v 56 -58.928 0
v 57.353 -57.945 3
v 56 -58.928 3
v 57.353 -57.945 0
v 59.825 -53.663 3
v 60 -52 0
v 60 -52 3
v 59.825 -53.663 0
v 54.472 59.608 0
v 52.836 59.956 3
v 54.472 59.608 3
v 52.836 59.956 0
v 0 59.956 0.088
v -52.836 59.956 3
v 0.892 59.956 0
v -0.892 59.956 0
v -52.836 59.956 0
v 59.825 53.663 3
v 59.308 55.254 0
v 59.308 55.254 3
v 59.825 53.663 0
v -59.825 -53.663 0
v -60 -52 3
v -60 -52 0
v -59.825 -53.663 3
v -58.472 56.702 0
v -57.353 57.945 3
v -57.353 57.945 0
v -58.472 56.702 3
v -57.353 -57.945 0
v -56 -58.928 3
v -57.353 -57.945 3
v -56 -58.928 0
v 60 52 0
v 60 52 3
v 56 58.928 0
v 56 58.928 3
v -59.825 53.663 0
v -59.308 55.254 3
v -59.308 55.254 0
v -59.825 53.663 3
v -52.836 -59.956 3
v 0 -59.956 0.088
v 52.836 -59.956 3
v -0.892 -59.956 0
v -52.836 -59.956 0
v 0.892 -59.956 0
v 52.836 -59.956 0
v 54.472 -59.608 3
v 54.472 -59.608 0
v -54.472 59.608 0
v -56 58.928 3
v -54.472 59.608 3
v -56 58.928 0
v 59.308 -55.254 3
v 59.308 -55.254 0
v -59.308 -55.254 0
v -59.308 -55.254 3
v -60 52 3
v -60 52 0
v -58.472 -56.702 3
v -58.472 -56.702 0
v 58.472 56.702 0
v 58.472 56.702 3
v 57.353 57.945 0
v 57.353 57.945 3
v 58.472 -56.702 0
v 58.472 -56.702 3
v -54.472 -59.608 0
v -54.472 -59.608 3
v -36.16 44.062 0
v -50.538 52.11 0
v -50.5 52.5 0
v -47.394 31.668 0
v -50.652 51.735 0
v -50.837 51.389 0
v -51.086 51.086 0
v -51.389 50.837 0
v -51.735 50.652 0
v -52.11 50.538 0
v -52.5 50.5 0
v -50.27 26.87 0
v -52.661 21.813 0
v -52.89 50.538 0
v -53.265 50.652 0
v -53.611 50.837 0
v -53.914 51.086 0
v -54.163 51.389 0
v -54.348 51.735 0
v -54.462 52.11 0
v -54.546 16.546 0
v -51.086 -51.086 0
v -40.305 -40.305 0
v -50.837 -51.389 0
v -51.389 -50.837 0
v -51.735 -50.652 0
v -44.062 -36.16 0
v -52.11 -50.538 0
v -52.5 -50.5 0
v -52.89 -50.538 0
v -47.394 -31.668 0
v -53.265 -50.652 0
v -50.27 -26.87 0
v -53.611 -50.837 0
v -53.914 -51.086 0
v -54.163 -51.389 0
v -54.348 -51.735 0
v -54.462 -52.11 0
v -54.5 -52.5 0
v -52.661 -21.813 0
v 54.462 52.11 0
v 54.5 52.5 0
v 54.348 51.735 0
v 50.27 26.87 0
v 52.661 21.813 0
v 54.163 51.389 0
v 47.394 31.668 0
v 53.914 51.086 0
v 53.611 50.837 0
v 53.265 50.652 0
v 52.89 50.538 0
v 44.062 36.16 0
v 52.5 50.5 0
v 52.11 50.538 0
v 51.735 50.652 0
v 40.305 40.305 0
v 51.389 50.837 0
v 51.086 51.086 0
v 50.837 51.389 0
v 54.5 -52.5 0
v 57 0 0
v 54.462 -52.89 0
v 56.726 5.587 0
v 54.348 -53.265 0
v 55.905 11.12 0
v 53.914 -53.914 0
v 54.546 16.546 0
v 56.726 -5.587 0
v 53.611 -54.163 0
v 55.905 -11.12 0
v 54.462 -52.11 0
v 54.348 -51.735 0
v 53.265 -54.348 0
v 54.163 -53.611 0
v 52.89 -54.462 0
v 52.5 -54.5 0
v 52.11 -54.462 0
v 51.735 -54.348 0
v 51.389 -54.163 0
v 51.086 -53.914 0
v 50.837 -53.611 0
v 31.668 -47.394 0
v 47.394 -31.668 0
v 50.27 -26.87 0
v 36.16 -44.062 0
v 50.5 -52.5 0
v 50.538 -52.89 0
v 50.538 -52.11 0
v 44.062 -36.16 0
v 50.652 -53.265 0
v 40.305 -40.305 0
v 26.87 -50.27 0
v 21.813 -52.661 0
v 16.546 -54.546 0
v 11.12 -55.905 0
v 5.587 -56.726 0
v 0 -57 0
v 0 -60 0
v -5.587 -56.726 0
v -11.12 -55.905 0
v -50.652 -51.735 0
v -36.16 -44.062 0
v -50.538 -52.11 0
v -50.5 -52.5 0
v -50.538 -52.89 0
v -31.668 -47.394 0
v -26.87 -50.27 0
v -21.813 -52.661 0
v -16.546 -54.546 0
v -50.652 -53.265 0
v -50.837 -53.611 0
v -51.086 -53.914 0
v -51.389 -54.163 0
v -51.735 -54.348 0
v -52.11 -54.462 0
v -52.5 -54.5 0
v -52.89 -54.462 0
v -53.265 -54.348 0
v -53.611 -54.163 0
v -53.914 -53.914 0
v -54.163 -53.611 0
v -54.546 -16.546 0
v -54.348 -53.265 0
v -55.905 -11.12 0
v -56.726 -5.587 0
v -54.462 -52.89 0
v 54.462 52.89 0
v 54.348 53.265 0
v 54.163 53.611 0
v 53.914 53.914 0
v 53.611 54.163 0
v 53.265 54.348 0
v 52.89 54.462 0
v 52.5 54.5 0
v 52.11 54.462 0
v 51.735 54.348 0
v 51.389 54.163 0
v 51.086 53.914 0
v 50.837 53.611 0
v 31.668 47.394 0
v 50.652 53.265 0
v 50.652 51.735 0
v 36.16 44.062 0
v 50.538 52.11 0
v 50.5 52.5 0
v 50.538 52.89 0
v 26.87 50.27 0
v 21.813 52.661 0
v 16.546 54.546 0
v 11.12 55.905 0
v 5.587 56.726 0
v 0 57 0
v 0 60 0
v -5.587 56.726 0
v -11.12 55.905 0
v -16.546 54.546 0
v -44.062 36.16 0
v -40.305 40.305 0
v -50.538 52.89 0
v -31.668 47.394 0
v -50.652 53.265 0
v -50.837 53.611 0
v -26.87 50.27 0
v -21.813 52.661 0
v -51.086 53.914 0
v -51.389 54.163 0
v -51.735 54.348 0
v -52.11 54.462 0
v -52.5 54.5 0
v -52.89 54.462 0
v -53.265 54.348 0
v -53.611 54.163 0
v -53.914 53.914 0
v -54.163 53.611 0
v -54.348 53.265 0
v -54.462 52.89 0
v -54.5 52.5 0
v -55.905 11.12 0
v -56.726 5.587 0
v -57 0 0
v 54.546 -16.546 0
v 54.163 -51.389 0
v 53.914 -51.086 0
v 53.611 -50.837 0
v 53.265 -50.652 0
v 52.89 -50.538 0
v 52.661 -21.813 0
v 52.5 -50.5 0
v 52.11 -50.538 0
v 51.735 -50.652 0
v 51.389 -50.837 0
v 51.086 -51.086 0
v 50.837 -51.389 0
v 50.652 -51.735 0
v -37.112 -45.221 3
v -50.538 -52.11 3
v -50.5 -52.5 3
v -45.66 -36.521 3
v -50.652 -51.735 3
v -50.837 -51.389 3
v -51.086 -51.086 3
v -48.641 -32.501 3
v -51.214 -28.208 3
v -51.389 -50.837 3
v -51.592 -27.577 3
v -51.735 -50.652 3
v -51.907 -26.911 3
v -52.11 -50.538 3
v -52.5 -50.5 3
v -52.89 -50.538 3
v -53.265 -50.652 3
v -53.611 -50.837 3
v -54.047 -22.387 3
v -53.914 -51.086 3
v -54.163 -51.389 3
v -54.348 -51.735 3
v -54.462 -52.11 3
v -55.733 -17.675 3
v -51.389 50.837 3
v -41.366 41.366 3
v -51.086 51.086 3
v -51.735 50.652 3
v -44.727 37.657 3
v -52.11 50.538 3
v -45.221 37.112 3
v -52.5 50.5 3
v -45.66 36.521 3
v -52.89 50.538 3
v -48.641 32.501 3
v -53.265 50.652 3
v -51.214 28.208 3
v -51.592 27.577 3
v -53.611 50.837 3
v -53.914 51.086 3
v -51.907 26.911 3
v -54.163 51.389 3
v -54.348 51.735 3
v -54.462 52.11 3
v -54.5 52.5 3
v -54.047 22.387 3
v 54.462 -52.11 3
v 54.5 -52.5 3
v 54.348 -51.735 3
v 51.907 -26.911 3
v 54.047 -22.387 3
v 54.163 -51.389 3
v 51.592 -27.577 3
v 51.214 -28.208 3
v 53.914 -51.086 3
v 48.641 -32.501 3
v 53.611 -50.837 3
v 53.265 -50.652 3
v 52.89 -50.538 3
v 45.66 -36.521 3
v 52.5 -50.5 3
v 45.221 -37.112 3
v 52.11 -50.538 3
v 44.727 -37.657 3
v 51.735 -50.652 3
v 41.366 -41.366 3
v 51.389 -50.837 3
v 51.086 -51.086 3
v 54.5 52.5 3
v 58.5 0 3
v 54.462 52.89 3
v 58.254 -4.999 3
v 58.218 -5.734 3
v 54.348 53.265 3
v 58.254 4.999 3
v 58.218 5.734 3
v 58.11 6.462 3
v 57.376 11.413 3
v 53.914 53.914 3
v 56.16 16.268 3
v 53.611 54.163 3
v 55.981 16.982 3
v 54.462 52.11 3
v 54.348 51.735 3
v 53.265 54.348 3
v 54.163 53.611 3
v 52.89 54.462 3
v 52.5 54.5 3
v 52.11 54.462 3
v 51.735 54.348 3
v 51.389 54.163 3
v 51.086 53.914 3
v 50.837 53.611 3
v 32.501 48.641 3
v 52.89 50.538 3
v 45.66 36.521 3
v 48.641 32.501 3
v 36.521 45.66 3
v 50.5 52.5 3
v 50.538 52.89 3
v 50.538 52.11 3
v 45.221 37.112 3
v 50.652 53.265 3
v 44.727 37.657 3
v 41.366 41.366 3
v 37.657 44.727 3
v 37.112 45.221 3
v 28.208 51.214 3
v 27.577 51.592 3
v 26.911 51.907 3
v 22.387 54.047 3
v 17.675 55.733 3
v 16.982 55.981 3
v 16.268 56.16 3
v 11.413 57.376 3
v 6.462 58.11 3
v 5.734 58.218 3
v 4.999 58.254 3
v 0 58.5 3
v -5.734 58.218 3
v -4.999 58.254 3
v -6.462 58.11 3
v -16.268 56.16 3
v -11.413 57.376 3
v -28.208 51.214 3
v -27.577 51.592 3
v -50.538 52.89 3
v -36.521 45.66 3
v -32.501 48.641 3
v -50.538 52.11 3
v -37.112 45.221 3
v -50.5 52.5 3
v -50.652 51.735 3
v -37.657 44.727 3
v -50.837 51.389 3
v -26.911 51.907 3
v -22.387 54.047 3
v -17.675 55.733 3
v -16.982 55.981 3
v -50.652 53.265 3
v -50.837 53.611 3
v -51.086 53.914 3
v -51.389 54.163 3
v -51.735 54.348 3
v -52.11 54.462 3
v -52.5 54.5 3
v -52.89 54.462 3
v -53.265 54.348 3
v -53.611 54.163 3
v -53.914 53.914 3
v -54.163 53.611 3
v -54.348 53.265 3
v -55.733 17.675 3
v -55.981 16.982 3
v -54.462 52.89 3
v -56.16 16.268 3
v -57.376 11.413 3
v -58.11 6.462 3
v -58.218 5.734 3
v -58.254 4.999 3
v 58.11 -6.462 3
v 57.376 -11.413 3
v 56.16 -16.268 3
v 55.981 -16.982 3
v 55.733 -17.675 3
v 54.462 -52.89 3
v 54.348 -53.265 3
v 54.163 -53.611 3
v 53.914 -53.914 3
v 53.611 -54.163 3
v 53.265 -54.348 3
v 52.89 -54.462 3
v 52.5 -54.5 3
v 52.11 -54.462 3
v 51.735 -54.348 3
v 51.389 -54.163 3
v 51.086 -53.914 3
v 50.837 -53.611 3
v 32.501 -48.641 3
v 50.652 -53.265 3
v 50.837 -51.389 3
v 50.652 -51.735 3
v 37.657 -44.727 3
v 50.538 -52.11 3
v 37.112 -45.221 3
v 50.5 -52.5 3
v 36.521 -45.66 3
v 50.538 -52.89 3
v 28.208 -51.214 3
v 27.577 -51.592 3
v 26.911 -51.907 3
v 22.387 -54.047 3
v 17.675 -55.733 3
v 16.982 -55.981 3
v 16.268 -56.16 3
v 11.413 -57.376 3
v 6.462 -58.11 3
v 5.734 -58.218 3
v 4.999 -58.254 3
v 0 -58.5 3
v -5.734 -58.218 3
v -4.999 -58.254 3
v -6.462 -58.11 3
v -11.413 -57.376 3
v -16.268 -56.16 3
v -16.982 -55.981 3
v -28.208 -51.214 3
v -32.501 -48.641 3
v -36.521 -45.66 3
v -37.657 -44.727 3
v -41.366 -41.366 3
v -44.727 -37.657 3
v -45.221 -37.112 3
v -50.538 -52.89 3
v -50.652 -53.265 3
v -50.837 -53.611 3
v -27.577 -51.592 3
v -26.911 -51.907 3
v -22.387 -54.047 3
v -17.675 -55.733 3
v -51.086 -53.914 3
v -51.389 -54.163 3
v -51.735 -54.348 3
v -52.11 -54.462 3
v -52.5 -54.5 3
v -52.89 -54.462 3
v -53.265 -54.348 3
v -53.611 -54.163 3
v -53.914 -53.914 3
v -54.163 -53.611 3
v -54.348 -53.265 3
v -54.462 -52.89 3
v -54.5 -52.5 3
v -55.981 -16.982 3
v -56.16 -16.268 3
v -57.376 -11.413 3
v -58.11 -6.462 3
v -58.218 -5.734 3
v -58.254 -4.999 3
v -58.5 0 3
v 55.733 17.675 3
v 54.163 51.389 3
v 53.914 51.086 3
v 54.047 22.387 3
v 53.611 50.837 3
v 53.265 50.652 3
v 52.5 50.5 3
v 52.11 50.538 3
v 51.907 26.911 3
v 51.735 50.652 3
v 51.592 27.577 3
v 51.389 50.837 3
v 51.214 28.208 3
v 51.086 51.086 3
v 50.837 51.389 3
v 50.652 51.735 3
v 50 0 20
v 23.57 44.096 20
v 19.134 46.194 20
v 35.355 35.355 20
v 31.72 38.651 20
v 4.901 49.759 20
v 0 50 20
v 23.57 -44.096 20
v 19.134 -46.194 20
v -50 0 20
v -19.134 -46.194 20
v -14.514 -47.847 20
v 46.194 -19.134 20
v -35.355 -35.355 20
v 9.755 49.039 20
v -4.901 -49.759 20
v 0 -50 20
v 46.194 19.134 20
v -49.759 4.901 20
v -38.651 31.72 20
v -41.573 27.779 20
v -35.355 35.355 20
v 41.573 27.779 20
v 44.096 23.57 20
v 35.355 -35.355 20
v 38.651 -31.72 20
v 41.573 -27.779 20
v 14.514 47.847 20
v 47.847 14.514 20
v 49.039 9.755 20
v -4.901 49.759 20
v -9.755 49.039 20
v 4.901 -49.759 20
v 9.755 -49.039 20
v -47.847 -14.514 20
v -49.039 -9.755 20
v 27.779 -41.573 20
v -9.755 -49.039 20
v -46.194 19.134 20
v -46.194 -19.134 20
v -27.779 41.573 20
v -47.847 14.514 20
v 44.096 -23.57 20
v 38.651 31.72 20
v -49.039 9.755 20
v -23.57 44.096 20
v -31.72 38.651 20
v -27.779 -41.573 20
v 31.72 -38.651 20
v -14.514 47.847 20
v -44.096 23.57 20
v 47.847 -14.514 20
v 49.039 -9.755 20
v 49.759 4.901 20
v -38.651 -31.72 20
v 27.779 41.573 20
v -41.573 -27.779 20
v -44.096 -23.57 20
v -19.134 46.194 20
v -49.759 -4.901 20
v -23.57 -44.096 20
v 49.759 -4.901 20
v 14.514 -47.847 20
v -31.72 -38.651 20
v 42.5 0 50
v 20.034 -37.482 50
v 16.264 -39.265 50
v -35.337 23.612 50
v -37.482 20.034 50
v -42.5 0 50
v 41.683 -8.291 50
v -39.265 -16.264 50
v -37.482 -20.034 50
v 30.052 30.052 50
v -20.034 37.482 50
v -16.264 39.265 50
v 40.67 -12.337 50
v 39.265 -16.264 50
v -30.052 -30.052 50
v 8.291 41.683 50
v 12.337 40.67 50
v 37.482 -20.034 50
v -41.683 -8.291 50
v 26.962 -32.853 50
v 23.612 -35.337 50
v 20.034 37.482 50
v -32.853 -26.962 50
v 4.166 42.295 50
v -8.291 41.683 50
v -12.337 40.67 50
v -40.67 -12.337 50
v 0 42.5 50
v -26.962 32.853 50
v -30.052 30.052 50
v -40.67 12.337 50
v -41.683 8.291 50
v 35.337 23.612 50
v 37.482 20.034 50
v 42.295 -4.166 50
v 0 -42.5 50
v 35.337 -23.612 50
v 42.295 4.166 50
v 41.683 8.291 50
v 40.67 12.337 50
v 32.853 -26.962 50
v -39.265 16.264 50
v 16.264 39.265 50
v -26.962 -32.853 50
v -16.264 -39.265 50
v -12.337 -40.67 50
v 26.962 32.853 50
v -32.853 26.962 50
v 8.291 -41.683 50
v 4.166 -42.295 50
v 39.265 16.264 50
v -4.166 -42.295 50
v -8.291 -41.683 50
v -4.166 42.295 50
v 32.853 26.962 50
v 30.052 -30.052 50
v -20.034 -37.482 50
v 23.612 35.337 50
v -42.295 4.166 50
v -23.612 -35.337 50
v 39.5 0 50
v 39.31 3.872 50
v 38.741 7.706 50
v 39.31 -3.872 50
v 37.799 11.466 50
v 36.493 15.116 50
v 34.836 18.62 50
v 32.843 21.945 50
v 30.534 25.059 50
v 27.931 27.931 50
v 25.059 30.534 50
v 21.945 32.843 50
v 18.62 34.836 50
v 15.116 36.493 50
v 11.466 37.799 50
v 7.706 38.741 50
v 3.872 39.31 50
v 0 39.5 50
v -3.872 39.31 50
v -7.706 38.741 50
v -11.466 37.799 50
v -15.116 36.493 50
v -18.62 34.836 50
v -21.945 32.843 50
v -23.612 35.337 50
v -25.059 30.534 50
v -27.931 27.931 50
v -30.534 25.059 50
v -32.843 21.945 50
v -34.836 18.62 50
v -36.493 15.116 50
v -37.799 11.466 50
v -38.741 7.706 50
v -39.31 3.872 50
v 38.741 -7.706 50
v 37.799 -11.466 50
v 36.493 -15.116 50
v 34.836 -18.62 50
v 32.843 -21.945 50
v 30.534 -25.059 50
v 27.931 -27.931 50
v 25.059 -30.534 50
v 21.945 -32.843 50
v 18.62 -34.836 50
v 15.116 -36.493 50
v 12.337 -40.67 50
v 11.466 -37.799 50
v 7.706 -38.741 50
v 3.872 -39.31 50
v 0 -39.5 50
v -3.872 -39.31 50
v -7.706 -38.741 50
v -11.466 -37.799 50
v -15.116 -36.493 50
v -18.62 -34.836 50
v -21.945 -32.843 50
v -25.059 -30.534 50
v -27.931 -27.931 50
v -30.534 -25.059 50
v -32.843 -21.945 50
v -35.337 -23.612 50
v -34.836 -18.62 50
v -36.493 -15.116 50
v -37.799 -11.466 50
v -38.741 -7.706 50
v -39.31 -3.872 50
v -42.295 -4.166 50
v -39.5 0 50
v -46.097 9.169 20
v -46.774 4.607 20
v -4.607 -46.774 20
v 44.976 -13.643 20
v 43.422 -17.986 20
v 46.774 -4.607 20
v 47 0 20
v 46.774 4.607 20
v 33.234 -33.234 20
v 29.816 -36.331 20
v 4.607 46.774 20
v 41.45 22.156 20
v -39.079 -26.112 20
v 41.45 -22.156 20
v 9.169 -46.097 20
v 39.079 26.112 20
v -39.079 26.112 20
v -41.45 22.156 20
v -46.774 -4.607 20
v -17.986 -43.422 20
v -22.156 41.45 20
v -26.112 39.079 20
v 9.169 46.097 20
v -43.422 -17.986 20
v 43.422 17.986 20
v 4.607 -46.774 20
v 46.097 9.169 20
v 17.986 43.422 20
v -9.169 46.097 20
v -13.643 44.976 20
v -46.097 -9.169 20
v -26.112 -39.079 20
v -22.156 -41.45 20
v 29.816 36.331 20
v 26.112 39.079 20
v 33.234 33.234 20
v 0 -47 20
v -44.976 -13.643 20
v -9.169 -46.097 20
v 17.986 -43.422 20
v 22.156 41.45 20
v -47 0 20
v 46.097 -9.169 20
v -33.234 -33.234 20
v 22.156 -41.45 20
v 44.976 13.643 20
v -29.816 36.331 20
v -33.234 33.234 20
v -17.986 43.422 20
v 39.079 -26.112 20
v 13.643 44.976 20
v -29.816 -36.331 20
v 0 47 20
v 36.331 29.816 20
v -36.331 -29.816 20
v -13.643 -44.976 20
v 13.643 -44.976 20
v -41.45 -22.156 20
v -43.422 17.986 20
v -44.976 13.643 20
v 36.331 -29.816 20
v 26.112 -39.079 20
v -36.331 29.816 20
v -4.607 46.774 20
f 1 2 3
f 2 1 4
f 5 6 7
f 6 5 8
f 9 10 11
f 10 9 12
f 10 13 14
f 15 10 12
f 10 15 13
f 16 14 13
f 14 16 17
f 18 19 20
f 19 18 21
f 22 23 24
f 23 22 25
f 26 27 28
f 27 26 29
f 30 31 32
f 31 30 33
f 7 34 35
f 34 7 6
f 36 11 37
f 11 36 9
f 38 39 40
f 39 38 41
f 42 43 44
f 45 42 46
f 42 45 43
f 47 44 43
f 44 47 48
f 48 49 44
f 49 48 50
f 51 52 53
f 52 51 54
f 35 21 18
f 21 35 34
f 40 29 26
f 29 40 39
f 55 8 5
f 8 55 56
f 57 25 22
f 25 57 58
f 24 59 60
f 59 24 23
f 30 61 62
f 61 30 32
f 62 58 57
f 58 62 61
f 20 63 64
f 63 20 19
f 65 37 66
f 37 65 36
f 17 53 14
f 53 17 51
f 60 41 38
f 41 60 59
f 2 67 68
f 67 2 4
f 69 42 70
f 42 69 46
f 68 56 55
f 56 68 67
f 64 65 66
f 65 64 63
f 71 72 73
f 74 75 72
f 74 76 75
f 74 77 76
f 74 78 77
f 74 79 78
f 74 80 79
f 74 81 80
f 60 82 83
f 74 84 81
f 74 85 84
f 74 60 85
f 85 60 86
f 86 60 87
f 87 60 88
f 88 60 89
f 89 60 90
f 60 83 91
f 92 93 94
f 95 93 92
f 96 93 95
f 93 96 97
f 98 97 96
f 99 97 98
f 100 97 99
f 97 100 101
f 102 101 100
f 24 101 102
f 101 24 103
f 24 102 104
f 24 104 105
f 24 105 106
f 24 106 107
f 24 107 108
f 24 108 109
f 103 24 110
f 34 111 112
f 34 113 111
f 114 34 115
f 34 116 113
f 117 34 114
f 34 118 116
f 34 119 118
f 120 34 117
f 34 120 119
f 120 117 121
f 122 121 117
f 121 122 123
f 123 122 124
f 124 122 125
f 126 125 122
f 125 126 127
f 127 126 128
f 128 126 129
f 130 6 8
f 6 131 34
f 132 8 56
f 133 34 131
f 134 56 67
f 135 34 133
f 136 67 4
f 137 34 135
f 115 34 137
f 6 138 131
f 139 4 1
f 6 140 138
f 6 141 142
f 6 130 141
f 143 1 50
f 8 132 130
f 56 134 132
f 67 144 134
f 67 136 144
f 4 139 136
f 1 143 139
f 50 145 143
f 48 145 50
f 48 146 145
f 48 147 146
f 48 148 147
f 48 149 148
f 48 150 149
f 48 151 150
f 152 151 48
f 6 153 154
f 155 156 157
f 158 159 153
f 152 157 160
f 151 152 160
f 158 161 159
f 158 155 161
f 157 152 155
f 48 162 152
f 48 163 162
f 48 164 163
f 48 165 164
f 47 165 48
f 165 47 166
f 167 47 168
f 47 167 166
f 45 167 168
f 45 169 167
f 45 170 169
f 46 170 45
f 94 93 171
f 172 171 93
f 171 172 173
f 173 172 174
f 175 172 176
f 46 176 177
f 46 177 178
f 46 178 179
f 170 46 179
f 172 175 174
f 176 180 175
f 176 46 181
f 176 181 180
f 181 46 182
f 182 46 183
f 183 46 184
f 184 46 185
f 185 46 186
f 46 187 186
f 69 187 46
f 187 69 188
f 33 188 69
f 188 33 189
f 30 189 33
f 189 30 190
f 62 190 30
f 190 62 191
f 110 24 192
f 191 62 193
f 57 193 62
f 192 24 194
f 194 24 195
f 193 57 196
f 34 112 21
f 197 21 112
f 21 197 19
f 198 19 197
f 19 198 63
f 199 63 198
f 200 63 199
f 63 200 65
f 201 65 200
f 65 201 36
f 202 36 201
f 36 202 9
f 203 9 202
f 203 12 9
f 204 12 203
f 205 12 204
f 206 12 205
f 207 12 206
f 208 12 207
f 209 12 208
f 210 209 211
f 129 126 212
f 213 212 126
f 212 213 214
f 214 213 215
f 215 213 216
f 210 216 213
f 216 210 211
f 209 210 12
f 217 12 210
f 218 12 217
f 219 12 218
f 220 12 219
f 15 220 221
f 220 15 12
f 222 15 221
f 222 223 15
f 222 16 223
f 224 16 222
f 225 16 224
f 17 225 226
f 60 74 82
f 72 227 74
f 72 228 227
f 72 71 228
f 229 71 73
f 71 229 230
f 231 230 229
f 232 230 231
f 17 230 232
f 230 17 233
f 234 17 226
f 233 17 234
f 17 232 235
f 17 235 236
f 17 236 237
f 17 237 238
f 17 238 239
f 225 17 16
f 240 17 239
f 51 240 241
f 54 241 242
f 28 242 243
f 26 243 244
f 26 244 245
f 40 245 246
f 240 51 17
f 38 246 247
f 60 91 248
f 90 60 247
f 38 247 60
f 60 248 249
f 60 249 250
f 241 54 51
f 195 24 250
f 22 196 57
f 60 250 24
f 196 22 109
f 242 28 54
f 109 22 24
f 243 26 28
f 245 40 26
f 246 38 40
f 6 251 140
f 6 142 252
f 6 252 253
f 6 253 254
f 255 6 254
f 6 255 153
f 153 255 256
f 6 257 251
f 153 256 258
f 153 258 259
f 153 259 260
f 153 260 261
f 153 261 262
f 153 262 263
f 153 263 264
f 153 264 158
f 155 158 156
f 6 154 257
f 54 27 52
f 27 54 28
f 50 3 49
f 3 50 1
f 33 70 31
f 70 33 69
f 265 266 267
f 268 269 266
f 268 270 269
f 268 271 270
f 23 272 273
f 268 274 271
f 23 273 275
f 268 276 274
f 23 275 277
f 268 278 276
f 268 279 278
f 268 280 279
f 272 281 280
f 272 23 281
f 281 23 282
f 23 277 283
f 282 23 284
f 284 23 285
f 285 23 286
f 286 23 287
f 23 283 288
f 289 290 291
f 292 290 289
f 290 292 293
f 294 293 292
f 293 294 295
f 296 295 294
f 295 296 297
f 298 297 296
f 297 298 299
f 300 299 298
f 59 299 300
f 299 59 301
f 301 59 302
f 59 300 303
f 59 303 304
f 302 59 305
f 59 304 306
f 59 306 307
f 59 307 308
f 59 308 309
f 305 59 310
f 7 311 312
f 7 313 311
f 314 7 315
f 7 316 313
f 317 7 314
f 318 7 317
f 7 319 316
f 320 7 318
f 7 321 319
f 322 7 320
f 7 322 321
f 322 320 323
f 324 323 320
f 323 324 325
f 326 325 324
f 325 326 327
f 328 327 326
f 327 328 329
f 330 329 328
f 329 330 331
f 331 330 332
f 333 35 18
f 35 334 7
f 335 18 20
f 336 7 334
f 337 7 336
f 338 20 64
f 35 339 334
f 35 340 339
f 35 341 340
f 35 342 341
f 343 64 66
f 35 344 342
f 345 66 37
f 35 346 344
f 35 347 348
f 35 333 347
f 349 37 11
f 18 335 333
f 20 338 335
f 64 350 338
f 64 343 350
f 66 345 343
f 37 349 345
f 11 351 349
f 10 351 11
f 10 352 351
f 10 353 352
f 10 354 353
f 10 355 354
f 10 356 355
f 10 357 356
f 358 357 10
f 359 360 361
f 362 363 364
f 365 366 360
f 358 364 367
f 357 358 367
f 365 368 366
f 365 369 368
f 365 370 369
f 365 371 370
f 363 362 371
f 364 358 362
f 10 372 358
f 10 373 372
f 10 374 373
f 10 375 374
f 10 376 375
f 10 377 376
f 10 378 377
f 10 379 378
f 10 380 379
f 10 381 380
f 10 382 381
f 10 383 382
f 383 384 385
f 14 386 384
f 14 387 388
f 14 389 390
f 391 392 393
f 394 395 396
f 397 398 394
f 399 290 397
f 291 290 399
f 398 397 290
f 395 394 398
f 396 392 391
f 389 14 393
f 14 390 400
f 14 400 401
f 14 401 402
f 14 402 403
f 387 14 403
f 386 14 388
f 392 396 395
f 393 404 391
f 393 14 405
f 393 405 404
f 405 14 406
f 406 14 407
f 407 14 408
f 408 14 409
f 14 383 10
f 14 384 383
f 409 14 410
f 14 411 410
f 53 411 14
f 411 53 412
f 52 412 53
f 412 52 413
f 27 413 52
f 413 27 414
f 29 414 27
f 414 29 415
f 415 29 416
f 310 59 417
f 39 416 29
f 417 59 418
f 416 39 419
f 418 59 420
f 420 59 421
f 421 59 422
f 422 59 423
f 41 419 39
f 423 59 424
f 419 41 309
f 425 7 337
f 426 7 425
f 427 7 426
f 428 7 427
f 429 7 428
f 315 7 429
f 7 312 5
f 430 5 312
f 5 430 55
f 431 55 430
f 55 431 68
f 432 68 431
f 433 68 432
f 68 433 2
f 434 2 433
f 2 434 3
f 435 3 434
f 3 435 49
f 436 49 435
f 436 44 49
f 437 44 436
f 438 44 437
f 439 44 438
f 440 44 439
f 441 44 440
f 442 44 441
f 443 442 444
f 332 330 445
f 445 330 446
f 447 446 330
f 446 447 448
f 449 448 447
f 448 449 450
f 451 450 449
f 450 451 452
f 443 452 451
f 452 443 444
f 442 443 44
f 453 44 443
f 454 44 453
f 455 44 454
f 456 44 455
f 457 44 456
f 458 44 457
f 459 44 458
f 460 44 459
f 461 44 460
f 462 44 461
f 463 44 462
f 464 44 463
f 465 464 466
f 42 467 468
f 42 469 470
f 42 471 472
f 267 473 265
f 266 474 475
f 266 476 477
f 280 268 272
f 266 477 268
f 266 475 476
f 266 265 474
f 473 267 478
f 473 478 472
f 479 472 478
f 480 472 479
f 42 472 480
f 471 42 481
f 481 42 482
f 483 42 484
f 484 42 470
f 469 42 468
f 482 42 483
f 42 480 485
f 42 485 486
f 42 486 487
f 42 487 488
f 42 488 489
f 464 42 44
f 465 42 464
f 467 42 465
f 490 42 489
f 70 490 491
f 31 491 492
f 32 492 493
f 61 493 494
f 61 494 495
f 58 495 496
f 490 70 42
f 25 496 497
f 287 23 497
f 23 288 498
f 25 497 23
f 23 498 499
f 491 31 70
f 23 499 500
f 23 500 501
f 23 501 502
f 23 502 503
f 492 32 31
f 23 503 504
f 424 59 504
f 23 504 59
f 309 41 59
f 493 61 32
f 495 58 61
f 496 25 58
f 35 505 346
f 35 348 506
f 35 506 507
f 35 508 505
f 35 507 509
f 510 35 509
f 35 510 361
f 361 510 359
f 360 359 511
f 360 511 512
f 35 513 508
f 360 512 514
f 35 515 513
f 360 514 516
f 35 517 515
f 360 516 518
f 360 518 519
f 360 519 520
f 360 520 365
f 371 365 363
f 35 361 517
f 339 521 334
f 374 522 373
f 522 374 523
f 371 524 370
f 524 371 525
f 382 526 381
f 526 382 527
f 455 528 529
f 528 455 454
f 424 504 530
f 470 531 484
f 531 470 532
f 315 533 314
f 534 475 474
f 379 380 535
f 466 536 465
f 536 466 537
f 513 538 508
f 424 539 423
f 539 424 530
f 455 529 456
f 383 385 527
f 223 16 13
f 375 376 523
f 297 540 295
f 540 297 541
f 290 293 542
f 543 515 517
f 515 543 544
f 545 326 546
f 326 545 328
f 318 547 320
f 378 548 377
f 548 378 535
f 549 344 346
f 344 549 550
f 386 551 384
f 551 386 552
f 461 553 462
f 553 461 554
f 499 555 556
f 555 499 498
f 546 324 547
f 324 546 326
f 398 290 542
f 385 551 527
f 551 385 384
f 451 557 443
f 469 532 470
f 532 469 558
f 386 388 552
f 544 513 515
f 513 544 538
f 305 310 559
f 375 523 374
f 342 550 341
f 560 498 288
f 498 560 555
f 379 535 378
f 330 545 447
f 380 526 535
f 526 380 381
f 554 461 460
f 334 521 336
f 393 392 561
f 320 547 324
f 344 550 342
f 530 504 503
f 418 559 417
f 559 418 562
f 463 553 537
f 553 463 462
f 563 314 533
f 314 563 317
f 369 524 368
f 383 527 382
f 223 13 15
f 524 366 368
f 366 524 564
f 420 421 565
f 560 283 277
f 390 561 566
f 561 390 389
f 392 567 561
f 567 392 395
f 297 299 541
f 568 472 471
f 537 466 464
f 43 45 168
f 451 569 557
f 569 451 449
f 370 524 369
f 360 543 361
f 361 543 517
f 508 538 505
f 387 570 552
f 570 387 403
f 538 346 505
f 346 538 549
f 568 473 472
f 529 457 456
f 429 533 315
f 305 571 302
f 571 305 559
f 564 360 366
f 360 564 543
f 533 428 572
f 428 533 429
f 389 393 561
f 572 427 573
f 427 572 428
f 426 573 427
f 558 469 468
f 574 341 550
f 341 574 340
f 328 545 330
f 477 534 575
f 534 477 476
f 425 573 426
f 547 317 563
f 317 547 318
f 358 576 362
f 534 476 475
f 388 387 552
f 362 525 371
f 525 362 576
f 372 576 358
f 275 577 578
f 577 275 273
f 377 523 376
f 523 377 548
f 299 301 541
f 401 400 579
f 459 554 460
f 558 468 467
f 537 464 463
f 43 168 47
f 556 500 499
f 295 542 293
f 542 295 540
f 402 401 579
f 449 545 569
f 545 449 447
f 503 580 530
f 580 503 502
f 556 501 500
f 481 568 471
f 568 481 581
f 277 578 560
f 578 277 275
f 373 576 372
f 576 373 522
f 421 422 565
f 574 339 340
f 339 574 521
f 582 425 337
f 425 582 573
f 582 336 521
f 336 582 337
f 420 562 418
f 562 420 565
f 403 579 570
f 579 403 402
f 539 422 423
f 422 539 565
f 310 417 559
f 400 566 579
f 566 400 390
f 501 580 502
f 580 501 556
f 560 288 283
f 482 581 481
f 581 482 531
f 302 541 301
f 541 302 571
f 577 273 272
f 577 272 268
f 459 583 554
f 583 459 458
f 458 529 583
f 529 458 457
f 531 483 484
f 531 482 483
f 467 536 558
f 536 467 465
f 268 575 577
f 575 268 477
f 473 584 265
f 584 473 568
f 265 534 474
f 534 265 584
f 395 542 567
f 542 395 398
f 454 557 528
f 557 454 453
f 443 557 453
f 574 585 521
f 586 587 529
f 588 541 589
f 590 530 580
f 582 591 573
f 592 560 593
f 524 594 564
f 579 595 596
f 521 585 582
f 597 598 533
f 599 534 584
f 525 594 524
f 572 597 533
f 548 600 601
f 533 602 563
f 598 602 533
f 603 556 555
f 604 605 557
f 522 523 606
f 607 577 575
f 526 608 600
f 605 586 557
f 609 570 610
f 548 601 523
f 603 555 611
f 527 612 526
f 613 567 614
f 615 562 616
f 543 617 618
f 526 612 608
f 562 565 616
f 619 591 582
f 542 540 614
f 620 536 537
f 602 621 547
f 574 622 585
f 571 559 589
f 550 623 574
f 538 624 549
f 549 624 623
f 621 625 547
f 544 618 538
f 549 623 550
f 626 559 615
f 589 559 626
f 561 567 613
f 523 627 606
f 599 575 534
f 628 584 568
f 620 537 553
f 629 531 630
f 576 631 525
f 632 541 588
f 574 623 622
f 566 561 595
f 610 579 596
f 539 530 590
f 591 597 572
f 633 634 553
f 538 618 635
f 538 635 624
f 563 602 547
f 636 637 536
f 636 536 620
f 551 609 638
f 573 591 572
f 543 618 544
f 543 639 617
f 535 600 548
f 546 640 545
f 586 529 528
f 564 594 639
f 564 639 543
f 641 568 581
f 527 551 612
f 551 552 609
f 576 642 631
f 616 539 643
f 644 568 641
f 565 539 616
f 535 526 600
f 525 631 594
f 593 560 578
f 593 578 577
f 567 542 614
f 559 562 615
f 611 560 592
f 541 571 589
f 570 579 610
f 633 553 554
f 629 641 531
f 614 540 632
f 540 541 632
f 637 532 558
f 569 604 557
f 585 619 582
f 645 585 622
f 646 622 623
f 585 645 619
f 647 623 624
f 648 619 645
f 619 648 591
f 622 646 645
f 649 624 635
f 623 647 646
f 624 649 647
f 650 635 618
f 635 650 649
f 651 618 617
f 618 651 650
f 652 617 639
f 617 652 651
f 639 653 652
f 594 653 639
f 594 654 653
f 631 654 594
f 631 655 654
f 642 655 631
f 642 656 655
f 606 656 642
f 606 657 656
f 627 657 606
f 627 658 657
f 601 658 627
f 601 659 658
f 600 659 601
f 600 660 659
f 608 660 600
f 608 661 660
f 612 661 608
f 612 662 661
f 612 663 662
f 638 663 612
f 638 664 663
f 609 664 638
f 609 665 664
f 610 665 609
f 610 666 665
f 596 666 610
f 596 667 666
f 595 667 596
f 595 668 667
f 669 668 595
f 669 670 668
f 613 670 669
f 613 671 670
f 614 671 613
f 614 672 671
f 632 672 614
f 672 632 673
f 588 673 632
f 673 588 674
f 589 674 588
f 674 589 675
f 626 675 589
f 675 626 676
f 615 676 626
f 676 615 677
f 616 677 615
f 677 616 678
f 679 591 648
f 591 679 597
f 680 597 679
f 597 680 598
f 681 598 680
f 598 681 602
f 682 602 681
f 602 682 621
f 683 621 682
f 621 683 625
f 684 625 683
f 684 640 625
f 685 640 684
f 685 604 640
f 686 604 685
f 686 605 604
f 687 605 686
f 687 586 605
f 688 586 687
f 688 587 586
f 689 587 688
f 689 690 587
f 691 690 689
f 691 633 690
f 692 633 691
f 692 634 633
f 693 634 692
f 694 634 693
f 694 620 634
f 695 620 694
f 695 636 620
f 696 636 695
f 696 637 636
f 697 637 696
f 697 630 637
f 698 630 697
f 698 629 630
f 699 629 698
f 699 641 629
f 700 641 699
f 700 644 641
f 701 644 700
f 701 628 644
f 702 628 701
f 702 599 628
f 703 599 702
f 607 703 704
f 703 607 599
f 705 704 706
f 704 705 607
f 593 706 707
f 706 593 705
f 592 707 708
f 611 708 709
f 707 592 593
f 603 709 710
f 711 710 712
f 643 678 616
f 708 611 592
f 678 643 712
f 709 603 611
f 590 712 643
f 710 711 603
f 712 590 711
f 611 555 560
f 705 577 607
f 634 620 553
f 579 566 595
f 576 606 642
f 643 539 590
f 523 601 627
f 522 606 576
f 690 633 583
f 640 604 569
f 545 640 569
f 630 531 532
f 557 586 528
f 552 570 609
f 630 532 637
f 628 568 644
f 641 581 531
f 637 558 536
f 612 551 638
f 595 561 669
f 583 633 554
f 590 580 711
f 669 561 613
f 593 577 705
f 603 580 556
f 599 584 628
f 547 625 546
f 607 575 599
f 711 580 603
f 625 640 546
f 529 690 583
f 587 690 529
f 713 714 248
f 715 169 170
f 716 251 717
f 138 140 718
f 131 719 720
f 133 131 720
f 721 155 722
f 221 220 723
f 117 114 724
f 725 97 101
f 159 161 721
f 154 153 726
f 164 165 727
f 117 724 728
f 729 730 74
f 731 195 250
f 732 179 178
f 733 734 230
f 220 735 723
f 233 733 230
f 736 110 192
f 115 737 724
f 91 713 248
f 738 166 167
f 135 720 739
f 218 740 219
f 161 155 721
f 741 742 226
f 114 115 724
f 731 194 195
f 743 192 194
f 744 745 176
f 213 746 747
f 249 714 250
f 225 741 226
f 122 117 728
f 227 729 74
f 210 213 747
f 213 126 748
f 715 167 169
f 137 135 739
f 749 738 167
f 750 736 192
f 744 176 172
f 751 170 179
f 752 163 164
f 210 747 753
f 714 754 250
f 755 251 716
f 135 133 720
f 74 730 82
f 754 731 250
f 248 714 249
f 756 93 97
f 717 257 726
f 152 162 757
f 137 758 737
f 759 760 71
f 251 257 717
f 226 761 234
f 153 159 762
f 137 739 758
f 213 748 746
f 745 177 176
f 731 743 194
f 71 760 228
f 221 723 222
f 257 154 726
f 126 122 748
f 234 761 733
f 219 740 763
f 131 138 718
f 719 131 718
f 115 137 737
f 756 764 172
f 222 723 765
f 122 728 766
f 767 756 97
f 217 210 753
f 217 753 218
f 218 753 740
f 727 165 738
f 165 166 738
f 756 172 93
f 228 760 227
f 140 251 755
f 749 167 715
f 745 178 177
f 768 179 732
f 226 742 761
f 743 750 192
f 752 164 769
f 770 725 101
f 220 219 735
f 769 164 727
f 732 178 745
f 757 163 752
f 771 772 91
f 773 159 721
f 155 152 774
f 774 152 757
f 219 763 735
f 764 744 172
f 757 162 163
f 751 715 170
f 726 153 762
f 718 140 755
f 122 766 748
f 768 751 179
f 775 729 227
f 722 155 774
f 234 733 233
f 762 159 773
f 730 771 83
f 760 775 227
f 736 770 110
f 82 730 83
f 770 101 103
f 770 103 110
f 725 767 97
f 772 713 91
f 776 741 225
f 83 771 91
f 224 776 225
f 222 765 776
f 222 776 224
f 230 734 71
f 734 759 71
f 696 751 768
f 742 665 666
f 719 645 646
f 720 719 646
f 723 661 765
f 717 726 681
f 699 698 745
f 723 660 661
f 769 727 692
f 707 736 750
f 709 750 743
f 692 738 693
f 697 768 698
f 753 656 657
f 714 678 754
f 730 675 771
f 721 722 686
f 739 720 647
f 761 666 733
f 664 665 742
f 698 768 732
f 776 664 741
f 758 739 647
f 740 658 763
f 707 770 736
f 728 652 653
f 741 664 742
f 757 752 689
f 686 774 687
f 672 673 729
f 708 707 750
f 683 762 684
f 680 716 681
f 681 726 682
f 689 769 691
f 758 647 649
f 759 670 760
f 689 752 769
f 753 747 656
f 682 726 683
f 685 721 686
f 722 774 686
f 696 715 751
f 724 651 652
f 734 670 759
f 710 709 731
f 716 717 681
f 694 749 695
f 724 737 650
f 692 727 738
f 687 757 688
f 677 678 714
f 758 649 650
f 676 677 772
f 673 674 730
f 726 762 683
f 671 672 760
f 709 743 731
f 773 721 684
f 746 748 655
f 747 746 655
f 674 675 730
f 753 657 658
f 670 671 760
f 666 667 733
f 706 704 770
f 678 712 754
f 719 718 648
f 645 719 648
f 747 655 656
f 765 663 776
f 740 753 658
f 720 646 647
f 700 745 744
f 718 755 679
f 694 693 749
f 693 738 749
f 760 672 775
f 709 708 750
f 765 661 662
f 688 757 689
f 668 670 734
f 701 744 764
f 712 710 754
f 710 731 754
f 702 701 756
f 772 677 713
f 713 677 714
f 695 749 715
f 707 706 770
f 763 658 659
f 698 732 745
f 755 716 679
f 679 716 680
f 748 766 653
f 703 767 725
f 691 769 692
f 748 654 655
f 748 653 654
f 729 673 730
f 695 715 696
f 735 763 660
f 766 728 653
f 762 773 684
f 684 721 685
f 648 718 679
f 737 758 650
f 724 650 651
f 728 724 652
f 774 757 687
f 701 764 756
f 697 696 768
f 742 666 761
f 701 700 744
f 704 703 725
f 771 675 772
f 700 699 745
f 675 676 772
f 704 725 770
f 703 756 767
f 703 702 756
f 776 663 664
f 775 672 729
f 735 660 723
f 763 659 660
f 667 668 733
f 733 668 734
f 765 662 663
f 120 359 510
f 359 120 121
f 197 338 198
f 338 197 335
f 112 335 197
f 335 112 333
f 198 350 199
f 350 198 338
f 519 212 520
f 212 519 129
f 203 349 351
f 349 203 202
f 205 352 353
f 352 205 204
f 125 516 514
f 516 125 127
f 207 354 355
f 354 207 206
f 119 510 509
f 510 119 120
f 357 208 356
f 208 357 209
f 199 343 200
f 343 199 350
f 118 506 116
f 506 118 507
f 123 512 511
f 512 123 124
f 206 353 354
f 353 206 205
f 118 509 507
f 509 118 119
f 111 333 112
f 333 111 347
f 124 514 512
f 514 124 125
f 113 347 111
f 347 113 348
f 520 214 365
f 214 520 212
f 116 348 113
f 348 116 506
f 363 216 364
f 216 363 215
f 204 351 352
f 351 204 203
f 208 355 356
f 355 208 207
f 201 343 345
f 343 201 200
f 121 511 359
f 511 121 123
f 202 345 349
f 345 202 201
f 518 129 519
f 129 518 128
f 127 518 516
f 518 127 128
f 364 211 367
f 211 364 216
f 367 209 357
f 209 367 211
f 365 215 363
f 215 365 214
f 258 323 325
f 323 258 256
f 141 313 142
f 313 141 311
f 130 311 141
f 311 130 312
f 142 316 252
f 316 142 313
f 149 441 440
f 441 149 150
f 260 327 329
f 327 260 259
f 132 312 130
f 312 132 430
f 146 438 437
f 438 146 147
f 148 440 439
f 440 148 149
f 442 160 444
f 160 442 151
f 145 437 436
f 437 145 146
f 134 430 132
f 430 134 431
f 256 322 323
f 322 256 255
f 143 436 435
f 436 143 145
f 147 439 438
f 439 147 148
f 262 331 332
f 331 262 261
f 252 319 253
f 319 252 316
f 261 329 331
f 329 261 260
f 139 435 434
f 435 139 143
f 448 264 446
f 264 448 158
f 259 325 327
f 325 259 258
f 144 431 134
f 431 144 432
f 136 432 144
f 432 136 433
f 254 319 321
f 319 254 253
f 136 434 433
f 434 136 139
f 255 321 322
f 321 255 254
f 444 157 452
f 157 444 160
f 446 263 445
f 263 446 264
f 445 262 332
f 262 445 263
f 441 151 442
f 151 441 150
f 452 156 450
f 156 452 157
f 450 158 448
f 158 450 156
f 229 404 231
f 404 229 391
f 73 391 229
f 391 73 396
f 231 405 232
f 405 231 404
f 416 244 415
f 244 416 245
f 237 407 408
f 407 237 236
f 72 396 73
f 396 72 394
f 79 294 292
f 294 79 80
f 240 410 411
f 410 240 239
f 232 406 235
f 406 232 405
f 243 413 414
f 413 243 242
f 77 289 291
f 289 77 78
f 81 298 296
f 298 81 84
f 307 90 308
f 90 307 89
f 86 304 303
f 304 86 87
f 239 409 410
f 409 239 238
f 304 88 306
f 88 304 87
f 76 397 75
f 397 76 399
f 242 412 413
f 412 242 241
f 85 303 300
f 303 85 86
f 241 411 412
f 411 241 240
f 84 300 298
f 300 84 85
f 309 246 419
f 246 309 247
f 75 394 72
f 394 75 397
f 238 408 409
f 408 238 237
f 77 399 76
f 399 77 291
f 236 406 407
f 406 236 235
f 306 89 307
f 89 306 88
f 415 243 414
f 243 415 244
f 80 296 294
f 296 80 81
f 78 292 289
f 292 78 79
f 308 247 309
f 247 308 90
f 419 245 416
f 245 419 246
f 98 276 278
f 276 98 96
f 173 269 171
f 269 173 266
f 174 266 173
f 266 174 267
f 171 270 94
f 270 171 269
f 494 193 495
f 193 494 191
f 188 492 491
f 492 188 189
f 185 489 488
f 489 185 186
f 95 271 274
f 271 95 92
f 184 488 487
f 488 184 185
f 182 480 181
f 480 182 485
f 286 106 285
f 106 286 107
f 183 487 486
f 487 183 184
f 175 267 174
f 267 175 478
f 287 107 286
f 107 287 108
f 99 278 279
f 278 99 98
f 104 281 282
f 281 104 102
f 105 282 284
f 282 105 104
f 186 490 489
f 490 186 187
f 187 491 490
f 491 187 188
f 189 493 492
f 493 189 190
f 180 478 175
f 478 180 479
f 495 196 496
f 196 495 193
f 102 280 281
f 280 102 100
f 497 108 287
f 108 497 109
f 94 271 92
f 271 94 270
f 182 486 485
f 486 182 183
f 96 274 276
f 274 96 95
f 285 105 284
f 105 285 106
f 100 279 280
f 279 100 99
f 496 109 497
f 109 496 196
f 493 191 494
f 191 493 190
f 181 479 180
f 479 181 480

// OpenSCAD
screw_d = 105;

screw_hole = 4;
begin_d = 120;
end_d = 100;
end2_d = 85;
wall = 3;

h_1 = 20;
h_2 = 30;
fn = 64;

module roundedcube(xdim ,ydim ,zdim,rdim){
    hull(){
        fn=30;
        translate([rdim,rdim,0]) cylinder(r=rdim, h=zdim, $fn=fn);
        translate([xdim-rdim,rdim,0])cylinder(r=rdim, h=zdim, $fn=fn);

        translate([rdim,ydim-rdim,0]) cylinder(r=rdim, h=zdim, $fn=fn);
        translate([xdim-rdim,ydim-rdim,0]) cylinder(r=rdim, h=zdim, $fn=fn);
    }
}


difference() {
    union() {
        translate([-60,-60,0]) roundedcube(120,120,3,8);
        cylinder(d1=begin_d, d2=end_d, h=h_1, $fn = fn);
        
        translate([0,0,h_1]) cylinder(d1=end_d, d2=end2_d, h = h_2, $fn = fn);
    }
    cylinder(d1=begin_d-wall*2, d2=end_d-wall*2, h=h_1, $fn = fn);
    
    translate([0,0,h_1]) cylinder(d1=end_d-wall*2, d2=end2_d-wall*2, h = h_2, $fn = fn);
    //screw holes
    translate([screw_d/2, screw_d/2,-1]) cylinder(d=screw_hole, h = wall*2, $fn = 32);
    translate([screw_d/2, -screw_d/2, -1]) cylinder(d=screw_hole, h = wall*2, $fn = 32);
    translate([-screw_d/2, screw_d/2,-1]) cylinder(d=screw_hole, h = wall*2, $fn = 32);
    translate([-screw_d/2, -screw_d/2,-1]) cylinder(d=screw_hole, h = wall*2, $fn = 32);
    
}
